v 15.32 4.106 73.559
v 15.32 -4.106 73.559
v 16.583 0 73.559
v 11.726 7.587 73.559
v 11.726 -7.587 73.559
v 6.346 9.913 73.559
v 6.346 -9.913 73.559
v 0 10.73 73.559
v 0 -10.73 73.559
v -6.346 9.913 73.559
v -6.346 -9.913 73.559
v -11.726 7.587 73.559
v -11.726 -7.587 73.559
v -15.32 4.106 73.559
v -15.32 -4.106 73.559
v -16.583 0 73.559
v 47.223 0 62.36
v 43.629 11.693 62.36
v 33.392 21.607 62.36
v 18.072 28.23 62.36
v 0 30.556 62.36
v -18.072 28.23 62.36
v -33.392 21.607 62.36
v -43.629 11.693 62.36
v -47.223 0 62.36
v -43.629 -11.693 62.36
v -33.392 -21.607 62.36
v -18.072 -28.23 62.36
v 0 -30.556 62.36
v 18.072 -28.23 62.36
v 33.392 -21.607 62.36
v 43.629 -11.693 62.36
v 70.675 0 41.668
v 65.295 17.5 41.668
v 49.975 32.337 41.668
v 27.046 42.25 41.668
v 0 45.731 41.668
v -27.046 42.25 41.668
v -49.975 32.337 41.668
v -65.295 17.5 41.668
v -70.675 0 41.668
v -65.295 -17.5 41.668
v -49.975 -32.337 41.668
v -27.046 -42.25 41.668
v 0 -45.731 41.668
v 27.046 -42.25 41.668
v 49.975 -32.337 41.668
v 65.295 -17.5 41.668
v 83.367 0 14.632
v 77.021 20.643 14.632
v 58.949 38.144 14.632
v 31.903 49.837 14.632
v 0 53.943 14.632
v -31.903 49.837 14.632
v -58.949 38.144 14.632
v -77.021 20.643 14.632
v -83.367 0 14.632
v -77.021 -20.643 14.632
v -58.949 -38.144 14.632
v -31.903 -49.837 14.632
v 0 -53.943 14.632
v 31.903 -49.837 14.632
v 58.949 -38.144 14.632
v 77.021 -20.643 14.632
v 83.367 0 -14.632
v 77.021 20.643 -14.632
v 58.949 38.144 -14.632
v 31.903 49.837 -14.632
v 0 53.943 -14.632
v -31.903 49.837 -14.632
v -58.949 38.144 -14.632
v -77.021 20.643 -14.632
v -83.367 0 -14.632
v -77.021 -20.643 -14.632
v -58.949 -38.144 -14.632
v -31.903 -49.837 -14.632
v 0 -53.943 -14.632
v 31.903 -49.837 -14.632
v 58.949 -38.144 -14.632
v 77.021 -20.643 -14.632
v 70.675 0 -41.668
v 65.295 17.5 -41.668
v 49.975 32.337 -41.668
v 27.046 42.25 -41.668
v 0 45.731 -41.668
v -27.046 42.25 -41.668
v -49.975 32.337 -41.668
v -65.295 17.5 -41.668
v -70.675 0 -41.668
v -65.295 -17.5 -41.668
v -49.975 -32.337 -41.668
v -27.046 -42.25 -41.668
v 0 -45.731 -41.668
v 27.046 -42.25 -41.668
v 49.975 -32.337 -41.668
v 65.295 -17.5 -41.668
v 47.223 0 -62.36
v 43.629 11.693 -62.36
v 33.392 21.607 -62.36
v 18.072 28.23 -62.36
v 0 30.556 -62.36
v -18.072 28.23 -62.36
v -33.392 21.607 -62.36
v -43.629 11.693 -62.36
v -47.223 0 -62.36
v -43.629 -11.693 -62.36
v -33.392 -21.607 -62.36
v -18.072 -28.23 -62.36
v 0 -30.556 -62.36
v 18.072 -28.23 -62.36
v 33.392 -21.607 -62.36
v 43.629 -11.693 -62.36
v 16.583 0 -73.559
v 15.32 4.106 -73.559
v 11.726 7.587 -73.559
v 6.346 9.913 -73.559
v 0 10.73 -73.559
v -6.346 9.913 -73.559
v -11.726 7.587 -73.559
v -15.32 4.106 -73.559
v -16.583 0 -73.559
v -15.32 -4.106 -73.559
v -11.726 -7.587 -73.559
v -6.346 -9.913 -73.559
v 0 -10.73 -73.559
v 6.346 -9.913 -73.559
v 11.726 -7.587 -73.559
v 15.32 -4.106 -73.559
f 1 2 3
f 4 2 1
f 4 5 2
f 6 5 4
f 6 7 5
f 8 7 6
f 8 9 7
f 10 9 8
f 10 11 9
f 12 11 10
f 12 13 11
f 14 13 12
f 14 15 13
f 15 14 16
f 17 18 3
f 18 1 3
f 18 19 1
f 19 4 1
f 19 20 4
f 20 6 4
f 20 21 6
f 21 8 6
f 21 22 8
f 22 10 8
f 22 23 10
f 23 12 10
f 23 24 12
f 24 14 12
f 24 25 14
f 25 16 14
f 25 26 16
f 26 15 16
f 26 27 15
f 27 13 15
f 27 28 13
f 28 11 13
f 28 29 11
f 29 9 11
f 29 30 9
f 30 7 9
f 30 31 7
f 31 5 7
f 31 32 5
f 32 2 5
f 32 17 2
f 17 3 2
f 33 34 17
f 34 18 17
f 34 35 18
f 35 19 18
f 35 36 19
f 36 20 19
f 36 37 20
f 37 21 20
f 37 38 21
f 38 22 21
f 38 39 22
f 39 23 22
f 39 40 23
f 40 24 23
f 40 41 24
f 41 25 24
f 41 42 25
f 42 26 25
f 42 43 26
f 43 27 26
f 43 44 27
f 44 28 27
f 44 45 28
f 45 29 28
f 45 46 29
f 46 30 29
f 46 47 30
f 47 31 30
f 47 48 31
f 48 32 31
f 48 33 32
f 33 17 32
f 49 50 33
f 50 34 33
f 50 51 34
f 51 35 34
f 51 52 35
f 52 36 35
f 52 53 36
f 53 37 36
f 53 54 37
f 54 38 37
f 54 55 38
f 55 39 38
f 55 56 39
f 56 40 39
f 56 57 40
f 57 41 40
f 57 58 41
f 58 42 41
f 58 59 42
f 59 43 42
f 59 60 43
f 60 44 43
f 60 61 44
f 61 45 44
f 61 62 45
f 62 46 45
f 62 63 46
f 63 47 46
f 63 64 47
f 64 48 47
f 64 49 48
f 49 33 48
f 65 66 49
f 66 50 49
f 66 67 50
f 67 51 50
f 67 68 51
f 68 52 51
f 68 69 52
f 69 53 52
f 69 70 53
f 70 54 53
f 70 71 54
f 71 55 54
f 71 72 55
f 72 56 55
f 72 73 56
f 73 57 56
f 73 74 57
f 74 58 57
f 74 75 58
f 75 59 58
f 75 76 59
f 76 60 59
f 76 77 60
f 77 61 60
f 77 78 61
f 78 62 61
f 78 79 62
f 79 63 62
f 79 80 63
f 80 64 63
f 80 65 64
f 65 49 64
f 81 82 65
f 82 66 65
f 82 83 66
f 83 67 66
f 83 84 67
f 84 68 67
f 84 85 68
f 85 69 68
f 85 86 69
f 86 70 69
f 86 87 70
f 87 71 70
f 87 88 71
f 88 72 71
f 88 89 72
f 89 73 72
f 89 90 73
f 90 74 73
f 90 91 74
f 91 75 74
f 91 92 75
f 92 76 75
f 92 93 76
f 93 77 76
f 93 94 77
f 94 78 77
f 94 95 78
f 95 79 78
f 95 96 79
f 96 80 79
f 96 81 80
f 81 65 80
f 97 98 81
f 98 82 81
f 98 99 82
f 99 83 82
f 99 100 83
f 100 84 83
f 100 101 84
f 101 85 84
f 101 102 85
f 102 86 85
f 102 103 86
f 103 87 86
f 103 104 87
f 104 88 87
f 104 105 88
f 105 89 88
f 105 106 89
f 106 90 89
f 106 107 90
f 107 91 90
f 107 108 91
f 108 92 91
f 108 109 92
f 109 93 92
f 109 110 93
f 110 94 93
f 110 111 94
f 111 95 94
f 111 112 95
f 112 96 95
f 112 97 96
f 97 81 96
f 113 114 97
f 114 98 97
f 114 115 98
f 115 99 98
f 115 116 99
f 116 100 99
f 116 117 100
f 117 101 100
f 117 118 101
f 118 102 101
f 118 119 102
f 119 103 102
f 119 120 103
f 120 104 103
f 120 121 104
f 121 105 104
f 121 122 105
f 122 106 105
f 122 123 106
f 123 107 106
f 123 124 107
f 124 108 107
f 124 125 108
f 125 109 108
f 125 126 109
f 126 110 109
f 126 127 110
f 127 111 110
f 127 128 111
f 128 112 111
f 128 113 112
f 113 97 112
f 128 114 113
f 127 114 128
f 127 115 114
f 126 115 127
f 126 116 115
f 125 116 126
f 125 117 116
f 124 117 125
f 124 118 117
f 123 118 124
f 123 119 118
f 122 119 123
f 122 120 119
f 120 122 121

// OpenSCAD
// Generated by SolidPython 1.0.1 on 2020-07-29 00:46:53


scale(v = [17, 11, 15]) {
	sphere(r = 5);
}
/***********************************************
*********      SolidPython code:      **********
************************************************
 
# import packages: SolidPython
from solid import *
from solid.utils import *
from itertools import chain, combinations, permutations


class Resize:

    def __init__(self, scad_file):
        self.scad_file = scad_file
        #self.scad_file = import_scad(scad_file)
        # cone/cylinder param:
        self.r1 = 0
        self.r2 = 0
        self.h = 0
        # rectangular prism param:
        self.w = 0
        self.l = 0
        # ellipse param:
        self.r = 0

    # import OpenScad code (file name corresponds to shape)


    # classify shape + parameters
    def assign(self, param1, param2, param3):
        if self.scad_file == 'cone.scad':
            self.r1 = param1
            self.r2 = param2
            self.h = param3
        elif self.scad_file == 'cylinder.scad':
            self.r1 = param1
            self.r2 = param2
            self.h = param3
        elif self.scad_file == 'rectangularPrism.scad':
            self.h = param1
            self.l = param2
            self.w = param3
        else:
            self.r = param1
            self.h = param2

    # resize parameters
    def iterate(self):
        x = range(3, 20, 2)
        i = 1
        if self.scad_file == 'cone.scad':
            tempList = list(permutations(x, 2))
            for temp in tempList:
                param1 = temp[0]
                param2 = temp[1]
                filepath = 'produced_scad_files/' + 'cone' + str(param1) + '_' + str(param2) + '_' + '.scad'
                scad_render_to_file(cylinder(h=param1, r1=param2, r2=0), filepath)

        elif self.scad_file == 'cylinder.scad':
            tempList = list(permutations(x, 3))
            for temp in tempList:
                param1 = temp[0]
                param2 = temp[1]
                filepath = 'produced_scad_files/' + 'cylinder' + str(param1) + '_' + str(param2) + '_' + '.scad'
                scad_render_to_file(cylinder(h=param1, r1=param2, r2=param2), filepath)

        elif self.scad_file == 'rectangularPrism.scad':
            tempList = list(permutations(x, 3))
            for temp in tempList:
                param1 = temp[0]
                param2 = temp[1]
                param3 = temp[2]
                filepath = 'produced_scad_files/' + 'rectangularPrism' + str(param1) + '_' + str(param2) + '_' + str(
                    param3) + '.scad'
                scad_render_to_file(cube(size=(param1, param2, param3)), filepath)

        elif self.scad_file == 'ellipse.scad':
            tempList = list(permutations(x, 4))
            for temp in tempList:
                param1 = temp[0]
                param2 = temp[1]
                param3 = temp[2]
                param4 = temp[3]
                filepath = 'produced_scad_files/' + 'ellipse' + str(param1) + '_' + str(param2) + '_' + str(param3) + '_' + str(param4) + '.scad'
                scad_render_to_file(scale([param1, param2, param3])(sphere(r=param4)), filepath)

    def render_to_scadfile(self):
        scad_render_to_file(scad, 'example.scad') 
 
************************************************/
